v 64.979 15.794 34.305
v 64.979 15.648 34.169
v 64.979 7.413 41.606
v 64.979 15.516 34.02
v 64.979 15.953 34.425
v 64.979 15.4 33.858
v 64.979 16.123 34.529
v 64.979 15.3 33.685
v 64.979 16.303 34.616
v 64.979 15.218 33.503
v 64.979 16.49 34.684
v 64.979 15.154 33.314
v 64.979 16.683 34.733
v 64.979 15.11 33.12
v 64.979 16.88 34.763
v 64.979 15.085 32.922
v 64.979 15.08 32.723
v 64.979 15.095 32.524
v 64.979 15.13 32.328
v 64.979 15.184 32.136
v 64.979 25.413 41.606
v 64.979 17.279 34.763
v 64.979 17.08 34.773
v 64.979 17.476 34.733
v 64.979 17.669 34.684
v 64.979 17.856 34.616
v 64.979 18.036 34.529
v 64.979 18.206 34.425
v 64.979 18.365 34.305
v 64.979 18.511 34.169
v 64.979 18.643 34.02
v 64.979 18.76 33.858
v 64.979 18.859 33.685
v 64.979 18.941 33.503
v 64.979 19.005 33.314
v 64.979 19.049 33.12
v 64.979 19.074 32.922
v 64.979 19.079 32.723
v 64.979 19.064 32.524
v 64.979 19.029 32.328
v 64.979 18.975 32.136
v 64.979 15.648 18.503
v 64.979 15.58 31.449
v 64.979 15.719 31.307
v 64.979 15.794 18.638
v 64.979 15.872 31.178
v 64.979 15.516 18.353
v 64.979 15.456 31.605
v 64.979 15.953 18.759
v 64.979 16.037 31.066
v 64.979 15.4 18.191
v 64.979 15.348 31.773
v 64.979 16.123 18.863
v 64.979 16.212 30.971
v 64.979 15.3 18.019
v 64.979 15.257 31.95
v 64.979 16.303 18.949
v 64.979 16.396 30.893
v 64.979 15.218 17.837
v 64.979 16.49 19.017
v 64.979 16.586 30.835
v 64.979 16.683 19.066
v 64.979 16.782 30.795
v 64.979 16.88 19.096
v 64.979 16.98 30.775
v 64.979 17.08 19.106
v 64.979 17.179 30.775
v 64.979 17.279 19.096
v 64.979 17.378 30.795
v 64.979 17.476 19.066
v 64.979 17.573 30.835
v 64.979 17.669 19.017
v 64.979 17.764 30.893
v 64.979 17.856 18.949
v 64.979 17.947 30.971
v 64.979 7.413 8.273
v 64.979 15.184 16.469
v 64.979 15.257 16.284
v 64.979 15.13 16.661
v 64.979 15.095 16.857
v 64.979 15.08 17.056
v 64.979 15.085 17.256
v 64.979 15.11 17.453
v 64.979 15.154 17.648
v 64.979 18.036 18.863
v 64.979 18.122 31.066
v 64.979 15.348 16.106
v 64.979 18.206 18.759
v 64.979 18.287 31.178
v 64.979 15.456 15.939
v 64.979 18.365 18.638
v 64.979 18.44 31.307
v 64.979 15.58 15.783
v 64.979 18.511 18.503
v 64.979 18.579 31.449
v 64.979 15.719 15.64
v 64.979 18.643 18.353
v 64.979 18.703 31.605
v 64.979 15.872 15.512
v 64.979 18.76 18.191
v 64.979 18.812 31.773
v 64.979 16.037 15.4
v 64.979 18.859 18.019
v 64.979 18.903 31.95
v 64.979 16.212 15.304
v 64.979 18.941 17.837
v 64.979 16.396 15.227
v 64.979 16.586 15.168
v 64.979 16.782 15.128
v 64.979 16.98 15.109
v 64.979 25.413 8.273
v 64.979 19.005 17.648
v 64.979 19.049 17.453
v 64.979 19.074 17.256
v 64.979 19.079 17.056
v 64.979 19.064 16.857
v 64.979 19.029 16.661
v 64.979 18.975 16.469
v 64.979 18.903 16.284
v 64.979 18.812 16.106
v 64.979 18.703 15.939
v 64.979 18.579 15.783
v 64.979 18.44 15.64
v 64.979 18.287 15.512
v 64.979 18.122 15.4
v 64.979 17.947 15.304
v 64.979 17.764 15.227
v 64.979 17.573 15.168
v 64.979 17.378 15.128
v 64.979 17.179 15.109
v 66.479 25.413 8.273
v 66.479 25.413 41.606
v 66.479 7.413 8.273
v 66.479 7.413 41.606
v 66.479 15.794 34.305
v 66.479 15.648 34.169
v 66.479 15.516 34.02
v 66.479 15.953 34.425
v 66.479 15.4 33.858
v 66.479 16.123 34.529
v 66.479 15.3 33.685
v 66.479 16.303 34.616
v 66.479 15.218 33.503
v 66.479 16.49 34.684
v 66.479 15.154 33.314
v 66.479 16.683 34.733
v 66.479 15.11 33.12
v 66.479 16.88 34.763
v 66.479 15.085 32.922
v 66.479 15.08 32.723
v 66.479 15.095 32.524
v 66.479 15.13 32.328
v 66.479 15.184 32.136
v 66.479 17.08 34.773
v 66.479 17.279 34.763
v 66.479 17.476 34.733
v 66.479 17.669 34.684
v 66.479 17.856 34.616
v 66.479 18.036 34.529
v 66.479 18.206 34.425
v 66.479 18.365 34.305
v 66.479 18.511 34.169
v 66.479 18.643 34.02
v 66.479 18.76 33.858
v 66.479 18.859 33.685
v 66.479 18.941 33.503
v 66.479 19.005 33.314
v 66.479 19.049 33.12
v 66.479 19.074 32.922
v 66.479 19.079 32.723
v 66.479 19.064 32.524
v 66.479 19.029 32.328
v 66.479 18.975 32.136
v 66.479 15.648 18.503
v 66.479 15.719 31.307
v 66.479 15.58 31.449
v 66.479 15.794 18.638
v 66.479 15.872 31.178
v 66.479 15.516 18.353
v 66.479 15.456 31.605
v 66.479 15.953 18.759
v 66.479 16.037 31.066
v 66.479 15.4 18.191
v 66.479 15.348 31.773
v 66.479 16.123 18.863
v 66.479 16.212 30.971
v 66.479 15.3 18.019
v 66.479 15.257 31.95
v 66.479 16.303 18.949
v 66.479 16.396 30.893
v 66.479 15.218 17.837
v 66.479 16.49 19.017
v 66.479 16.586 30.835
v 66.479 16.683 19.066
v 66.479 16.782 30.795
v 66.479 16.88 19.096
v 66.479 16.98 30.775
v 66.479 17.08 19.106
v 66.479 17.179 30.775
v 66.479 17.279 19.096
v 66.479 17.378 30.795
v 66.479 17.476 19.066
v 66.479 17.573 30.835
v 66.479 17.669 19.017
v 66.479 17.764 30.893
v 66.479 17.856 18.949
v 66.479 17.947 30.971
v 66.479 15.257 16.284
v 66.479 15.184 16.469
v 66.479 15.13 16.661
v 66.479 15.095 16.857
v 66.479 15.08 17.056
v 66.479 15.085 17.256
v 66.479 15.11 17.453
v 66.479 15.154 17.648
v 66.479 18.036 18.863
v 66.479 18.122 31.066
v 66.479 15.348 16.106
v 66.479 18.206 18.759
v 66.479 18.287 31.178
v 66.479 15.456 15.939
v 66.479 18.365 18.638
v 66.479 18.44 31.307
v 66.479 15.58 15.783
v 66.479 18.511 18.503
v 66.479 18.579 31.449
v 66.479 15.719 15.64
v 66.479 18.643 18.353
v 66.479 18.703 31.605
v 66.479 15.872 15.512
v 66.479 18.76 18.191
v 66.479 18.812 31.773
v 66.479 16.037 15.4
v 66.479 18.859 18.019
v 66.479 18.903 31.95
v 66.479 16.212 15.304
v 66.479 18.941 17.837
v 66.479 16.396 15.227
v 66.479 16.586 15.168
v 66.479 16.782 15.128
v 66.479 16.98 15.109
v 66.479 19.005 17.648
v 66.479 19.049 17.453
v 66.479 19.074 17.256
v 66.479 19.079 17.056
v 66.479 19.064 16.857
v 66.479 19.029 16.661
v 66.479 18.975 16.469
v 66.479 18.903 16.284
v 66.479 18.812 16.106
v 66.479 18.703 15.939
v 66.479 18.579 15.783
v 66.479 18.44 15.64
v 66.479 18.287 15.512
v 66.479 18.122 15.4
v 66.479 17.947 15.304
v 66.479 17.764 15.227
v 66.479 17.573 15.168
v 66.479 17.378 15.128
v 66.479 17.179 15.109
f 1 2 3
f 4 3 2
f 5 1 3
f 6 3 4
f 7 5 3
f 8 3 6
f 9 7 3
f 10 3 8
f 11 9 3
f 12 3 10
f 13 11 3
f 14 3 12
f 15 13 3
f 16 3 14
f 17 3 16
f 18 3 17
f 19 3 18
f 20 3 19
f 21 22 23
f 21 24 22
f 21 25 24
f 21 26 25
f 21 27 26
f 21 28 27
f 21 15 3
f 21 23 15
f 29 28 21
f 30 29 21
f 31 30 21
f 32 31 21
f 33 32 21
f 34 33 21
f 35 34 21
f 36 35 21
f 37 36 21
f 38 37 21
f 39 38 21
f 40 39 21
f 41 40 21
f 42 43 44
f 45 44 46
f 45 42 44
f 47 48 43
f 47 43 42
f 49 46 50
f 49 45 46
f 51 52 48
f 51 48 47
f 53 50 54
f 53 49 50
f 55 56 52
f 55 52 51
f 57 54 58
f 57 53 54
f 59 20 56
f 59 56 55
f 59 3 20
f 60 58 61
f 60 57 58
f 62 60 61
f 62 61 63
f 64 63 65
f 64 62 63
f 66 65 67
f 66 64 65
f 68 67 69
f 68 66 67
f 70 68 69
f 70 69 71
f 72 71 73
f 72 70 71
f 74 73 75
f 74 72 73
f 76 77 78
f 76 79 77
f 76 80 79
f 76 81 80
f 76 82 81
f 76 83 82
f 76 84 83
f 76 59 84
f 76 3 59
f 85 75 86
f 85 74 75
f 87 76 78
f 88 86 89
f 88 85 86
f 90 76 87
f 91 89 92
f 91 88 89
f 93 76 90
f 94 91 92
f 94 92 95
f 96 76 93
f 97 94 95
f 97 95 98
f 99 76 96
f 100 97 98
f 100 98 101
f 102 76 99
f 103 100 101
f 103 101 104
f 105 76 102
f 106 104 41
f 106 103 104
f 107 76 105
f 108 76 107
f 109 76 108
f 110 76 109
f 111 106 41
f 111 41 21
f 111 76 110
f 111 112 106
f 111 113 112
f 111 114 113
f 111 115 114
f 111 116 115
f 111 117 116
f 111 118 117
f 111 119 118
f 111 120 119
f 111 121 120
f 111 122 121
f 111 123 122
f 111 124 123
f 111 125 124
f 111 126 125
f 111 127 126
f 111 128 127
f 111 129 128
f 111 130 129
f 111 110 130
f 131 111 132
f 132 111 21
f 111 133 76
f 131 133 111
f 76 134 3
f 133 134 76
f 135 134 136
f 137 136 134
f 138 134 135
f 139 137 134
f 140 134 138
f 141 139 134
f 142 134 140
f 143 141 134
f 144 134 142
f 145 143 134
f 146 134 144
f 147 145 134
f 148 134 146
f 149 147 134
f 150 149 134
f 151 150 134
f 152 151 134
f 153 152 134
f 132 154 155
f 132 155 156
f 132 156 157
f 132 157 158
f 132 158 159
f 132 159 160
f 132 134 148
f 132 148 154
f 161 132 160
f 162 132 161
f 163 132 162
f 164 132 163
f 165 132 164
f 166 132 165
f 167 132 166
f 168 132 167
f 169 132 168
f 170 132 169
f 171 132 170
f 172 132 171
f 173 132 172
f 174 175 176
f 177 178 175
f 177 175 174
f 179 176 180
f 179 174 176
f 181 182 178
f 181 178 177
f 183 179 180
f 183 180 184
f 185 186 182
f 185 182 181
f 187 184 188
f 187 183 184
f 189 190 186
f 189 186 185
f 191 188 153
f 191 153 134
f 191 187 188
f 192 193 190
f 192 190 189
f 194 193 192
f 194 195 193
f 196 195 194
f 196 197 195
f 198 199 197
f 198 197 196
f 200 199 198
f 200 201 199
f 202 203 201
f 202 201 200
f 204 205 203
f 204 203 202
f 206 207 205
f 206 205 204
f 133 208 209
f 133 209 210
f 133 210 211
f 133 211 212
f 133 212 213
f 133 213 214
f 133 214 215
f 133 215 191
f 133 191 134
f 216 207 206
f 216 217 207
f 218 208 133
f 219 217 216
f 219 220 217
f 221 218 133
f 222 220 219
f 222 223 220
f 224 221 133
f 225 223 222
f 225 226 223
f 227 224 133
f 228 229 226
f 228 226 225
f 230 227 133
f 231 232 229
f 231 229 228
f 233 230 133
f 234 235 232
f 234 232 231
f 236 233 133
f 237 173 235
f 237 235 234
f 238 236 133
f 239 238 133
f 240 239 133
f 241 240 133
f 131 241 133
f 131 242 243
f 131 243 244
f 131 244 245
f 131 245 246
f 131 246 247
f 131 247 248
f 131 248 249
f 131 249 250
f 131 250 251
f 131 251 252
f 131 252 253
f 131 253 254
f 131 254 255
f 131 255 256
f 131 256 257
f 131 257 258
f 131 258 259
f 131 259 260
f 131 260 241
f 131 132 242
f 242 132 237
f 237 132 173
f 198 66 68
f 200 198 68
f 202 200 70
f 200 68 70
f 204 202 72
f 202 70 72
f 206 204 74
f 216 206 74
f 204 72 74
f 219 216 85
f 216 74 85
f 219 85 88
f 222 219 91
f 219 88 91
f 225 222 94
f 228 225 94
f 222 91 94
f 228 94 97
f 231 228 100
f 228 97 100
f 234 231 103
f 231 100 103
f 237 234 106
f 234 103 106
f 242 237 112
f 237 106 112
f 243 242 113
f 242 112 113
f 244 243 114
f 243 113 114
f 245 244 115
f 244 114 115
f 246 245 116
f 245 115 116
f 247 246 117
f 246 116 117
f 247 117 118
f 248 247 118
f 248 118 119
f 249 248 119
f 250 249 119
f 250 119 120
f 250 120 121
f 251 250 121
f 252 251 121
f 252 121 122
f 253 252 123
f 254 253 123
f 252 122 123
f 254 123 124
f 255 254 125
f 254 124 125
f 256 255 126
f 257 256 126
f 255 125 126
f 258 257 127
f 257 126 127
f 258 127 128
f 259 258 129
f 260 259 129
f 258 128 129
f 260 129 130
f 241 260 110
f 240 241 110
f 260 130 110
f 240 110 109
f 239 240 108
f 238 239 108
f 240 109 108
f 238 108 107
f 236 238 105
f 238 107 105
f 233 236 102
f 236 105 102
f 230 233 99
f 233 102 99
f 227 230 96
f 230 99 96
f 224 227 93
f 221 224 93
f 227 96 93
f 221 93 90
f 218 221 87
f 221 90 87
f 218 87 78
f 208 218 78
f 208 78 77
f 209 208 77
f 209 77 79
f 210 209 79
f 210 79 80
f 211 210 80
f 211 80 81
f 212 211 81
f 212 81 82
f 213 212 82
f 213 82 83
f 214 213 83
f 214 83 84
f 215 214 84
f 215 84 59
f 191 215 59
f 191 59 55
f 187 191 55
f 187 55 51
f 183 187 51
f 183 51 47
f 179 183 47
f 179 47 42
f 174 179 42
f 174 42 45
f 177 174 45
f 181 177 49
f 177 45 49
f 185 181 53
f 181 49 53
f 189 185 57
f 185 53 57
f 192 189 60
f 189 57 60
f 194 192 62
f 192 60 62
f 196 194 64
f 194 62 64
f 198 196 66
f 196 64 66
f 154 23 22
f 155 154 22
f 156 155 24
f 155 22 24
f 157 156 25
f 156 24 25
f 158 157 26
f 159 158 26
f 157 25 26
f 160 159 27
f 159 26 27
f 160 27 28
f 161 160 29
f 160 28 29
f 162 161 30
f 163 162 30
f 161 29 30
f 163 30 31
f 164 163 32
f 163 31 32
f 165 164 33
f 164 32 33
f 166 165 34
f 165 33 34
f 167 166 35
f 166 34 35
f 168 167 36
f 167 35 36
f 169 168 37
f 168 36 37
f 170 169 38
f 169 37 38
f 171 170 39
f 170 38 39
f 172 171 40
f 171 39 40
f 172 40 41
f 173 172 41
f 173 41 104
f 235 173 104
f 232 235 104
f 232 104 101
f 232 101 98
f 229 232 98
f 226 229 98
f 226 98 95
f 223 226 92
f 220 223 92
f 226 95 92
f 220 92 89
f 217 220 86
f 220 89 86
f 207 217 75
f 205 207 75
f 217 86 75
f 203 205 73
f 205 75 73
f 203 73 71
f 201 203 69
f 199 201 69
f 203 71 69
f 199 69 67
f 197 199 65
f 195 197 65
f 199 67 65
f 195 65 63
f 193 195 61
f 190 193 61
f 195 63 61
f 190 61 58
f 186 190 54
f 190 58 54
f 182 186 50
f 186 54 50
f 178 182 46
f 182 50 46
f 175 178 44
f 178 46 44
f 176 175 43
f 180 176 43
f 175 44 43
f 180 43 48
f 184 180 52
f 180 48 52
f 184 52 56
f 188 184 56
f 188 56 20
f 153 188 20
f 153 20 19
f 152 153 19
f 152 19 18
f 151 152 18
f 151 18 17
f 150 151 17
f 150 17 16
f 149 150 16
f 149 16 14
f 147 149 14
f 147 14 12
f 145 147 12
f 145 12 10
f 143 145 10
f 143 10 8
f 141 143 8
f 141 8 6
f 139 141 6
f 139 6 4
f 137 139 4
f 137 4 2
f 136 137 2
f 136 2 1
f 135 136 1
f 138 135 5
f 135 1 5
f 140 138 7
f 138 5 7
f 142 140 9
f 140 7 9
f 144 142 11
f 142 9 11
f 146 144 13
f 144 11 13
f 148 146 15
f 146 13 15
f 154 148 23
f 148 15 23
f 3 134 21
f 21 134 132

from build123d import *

# Parameters (mm, degrees)
EKSTR_ZYON_NCE1_DEPTH = 50
IZIM2_R               = 3
KES_EKSTR_ZYON1_DEPTH = 78
IZIM3_R               = 0.5
KES_EKSTR_ZYON2_DEPTH = 22
IZIM4_R               = 6
KES_EKSTR_ZYON3_DEPTH = 22
SCALE1_SCALE          = 0.666666667
SKETCH3_W             = 33.333333334
SKETCH3_H             = 19.333333333
CUT_EXTRUDE1_DEPTH    = 2
SKETCH4_W             = 56
SKETCH4_H             = 55
BOSS_EXTRUDE1_DEPTH   = 2
SKETCH5_W             = 33.333333334
SKETCH5_H             = 18
BOSS_EXTRUDE2_DEPTH   = 1.5
SKETCH6_R             = 2
CUT_EXTRUDE2_DEPTH    = 1.5
SKETCH7_W             = 56.964320229
SKETCH7_H             = 23.03419096
CUT_EXTRUDE5_DEPTH    = 56
SKETCH8_W             = 56.142360806
SKETCH8_H             = 4.377004861
CUT_EXTRUDE6_DEPTH    = 2.5


with BuildPart() as part:
    # Çizim1 → Ekstrüzyon-İnce1 (new body)
    with BuildSketch(Plane.XY):
        with BuildLine():
            Line((0, 0), (0, 29))
            ThreePointArc((0, 29), (0.292893219, 29.707106781), (1, 30))
            Line((1, 30), (57, 30))
            ThreePointArc((57, 30), (57.707106781, 29.707106781), (58, 29))
            Line((58, 29), (58, 0))
            Line((58, 0), (57, 0))
            Line((57, 0), (57, 29))
            Line((57, 29), (1, 29))
            Line((1, 29), (1, 0))
            Line((1, 0), (0, 0))
        make_face()
    extrude(amount=EKSTR_ZYON_NCE1_DEPTH)

    # Çizim2 → Kes-Ekstrüzyon1 (cut)
    with BuildSketch(Plane(origin=(58, 0, 0), x_dir=(0, 0, -1), z_dir=(1, 0, 0))):
        with Locations((-36.75, 14.5)):
            Circle(IZIM2_R)
        with Locations((-13.25, 14.5)):
            Circle(IZIM2_R)
    extrude(amount=-KES_EKSTR_ZYON1_DEPTH, mode=Mode.SUBTRACT)

    # Çizim3 → Kes-Ekstrüzyon2 (cut)
    with BuildSketch(Plane.ZY):
        with Locations((46.926319902, 2.636193895)):
            Circle(IZIM3_R)
    extrude(amount=-KES_EKSTR_ZYON2_DEPTH, mode=Mode.SUBTRACT)

    # Çizim4 → Kes-Ekstrüzyon3 (cut)
    with BuildSketch(Plane.ZY):
        with Locations((36.75, 14.5)):
            Circle(IZIM4_R)
    extrude(amount=-KES_EKSTR_ZYON3_DEPTH, mode=Mode.SUBTRACT)


with BuildPart() as part_1:
    # Scale1: scaled about (29.437260205, 22.238846327, 24.818293672)
    add(part.part.scale(SCALE1_SCALE).moved(Location((9.812420068, 7.412948776, 8.272764557))))

    # Sketch3 → Cut-Extrude1 (cut)
    with BuildSketch(Plane(origin=(48.479086735, 0, 0), x_dir=(0, 0, -1), z_dir=(1, 0, 0))):
        with Locations((-24.939431224, 17.079615442)):
            Rectangle(SKETCH3_W, SKETCH3_H)
    extrude(amount=-CUT_EXTRUDE1_DEPTH, mode=Mode.SUBTRACT)

    # Sketch4 → Boss-Extrude1 (add)
    with BuildSketch(Plane(origin=(0, 27.412948776, 0), x_dir=(1, 0, 0), z_dir=(0, 1, 0))):
        with Locations((38.479086736, -24.938368242)):
            Rectangle(SKETCH4_W, SKETCH4_H)
    extrude(amount=-BOSS_EXTRUDE1_DEPTH)

    # Sketch5 → Boss-Extrude2 (add)
    with BuildSketch(Plane(origin=(66.479086736, 0, 0), x_dir=(0, 0, -1), z_dir=(1, 0, 0))):
        with Locations((-24.939431224, 16.412948776)):
            Rectangle(SKETCH5_W, SKETCH5_H)
    extrude(amount=-BOSS_EXTRUDE2_DEPTH)

    # Sketch6 → Cut-Extrude2 (cut)
    with BuildSketch(Plane.ZY.offset(-64.979086736)):
        with Locations((17.106097891, 17.079615442)):
            Circle(SKETCH6_R)
        with Locations((32.772764557, 17.079615442)):
            Circle(SKETCH6_R)
    extrude(amount=-CUT_EXTRUDE2_DEPTH, mode=Mode.SUBTRACT)

    # Sketch7 → Cut-Extrude5 (cut, through all)
    with BuildSketch(Plane(origin=(0, 0, -2.561631758), x_dir=(-1, 0, 0), z_dir=(0, 0, -1))):
        with Locations((-36.496926622, 18.930044256)):
            Rectangle(SKETCH7_W, SKETCH7_H)
    extrude(amount=-CUT_EXTRUDE5_DEPTH, mode=Mode.SUBTRACT)

    # Sketch8 → Cut-Extrude6 (cut, through all)
    with BuildSketch(Plane.ZY.offset(-64.979086736)):
        with Locations((24.367187839, 27.601451207)):
            Rectangle(SKETCH8_W, SKETCH8_H)
    extrude(amount=-CUT_EXTRUDE6_DEPTH, mode=Mode.SUBTRACT)


solid = part_1.part
